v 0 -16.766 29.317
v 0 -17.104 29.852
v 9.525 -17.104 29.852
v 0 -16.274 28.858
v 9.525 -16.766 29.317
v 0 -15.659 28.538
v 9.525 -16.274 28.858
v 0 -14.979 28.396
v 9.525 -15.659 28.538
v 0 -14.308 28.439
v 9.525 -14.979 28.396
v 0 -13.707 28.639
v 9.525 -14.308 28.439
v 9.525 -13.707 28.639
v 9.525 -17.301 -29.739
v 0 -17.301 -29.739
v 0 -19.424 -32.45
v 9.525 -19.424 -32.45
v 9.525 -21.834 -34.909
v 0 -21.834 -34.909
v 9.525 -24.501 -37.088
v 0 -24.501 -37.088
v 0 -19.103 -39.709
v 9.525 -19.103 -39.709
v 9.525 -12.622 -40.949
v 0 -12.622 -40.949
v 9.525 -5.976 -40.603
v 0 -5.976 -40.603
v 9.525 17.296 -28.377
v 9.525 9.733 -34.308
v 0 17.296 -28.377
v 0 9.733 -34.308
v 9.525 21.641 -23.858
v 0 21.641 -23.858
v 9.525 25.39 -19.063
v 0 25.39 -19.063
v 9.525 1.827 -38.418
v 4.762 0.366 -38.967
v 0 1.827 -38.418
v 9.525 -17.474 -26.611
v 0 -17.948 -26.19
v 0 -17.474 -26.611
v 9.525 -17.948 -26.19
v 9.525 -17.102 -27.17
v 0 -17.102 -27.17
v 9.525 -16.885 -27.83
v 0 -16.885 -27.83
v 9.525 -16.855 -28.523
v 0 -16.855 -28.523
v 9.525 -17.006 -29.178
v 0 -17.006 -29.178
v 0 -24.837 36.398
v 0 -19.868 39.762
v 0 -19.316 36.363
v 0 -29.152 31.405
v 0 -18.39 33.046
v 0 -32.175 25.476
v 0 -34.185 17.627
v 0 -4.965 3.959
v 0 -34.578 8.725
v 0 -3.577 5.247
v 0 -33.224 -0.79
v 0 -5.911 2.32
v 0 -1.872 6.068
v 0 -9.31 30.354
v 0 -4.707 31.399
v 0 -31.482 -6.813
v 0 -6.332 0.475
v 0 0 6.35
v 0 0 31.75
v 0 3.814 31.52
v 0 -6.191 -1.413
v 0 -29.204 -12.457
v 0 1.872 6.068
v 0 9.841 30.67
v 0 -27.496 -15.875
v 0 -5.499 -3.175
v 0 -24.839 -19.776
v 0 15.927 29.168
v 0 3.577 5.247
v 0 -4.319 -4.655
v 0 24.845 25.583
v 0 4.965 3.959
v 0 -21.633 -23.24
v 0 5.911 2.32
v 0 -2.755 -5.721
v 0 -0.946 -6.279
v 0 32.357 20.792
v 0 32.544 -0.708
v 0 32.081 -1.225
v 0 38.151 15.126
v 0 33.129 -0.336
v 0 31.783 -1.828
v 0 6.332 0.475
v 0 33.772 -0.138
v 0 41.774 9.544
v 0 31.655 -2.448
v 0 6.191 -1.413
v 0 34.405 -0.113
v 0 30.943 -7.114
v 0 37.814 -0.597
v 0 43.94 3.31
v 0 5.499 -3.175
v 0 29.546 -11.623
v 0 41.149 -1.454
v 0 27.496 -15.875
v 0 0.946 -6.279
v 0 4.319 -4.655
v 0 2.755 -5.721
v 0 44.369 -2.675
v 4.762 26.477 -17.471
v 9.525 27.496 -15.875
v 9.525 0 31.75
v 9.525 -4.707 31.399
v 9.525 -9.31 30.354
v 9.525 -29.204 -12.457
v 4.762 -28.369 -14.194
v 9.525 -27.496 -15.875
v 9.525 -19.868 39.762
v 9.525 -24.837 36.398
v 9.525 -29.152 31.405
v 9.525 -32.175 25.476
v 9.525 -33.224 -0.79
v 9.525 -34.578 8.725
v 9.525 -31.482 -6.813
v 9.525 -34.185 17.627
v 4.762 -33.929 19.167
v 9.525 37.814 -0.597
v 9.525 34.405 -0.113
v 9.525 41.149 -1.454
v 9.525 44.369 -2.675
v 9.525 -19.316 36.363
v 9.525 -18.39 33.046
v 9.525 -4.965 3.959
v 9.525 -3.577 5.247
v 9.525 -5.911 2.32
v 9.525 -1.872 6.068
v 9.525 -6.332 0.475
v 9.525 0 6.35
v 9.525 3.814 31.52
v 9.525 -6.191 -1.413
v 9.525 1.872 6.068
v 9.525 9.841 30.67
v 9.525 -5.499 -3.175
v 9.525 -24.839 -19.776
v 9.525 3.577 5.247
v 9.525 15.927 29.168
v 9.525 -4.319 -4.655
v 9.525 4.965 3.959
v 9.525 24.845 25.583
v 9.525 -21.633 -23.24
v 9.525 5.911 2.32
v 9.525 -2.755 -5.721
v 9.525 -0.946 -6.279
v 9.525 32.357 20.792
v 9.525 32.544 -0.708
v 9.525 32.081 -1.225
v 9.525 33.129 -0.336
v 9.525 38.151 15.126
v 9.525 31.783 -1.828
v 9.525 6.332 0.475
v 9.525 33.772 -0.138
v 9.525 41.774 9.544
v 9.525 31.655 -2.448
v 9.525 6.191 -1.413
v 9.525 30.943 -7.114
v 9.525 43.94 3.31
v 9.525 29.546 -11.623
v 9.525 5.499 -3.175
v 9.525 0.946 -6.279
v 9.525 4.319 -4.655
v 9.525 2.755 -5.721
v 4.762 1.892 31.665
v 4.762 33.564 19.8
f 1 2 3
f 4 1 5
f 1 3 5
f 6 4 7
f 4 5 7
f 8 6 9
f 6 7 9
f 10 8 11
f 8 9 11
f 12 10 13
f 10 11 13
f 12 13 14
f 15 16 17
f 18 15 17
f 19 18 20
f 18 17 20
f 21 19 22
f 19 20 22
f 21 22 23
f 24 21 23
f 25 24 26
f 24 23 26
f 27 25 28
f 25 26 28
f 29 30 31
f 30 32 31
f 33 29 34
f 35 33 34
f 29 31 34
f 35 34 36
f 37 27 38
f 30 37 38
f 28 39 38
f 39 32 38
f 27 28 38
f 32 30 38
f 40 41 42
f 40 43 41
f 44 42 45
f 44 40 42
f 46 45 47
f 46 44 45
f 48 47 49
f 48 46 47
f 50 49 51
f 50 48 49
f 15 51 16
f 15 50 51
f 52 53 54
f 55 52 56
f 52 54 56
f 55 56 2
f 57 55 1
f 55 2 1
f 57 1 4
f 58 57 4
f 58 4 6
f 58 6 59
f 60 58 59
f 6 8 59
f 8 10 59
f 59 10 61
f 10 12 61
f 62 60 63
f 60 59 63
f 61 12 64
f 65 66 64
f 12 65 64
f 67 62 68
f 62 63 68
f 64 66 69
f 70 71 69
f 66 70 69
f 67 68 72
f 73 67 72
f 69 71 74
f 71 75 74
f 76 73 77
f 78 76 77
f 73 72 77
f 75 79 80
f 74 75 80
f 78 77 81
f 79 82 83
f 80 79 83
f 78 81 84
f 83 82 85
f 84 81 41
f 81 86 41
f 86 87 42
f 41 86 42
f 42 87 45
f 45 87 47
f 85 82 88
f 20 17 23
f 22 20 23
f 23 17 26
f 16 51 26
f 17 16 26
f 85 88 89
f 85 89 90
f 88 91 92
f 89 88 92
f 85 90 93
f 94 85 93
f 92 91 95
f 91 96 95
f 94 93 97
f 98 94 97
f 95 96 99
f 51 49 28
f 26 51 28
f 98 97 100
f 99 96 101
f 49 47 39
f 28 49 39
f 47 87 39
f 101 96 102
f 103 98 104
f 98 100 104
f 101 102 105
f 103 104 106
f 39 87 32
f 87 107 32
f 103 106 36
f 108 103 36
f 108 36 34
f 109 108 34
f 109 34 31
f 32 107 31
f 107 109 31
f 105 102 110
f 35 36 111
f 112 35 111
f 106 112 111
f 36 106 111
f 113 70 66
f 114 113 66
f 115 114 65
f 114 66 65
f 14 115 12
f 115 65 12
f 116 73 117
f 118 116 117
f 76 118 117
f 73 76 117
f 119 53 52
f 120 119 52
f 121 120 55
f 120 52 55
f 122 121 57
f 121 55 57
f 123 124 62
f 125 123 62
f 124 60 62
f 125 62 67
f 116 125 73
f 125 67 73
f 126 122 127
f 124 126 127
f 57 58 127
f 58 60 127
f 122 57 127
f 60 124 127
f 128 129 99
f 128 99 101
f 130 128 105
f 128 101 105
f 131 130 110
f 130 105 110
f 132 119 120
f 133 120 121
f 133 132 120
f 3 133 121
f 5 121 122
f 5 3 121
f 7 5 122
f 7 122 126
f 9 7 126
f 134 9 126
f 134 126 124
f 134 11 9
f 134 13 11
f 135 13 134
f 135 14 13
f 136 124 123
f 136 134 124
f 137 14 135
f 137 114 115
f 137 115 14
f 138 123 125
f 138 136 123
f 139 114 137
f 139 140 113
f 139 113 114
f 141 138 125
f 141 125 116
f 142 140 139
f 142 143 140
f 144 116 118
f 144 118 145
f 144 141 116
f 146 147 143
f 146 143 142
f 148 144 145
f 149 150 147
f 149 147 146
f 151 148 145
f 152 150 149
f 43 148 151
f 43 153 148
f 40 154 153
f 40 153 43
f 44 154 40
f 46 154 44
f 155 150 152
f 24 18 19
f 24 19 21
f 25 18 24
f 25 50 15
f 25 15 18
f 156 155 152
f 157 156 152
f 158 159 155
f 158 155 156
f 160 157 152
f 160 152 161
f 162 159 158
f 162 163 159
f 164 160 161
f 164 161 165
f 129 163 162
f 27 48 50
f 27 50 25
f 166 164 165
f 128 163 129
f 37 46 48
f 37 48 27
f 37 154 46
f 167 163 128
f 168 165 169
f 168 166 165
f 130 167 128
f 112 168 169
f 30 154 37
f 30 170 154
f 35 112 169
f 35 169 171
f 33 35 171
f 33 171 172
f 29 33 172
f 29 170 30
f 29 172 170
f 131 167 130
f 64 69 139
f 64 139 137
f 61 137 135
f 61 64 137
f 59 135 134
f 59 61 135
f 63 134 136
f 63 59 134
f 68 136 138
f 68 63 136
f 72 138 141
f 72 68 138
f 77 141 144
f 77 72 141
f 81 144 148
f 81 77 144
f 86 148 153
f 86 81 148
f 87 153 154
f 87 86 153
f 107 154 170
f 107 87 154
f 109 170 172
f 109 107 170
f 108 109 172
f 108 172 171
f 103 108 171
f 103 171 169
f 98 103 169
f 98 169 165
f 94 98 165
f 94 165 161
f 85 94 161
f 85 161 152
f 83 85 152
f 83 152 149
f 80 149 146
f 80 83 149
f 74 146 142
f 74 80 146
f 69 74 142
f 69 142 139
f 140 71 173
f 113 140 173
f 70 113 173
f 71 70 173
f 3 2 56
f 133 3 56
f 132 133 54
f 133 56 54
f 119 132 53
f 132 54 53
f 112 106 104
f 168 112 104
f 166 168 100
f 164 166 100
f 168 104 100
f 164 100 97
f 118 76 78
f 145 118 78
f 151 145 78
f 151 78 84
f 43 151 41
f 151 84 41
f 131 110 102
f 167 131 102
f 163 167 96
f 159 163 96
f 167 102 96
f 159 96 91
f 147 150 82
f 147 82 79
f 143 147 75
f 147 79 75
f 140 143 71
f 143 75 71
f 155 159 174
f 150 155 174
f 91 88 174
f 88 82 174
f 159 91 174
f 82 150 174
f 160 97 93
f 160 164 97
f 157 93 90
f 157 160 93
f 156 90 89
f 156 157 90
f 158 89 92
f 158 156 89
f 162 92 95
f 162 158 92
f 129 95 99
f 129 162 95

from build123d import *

# Parameters (mm, degrees)
SKETCH1_R           = 6.35
BOSS_EXTRUDE3_DEPTH = 9.525
FILLET3_R           = 2.54


with BuildPart() as part:
    # Sketch1 → Boss-Extrude3 (new body)
    # profile 1 of 4: a face of its own
    with BuildSketch(Plane(origin=(0, 0, 0), x_dir=(0, 0, -1), z_dir=(1, 0, 0))):
        with BuildLine():
            ThreePointArc((-31.520099492, 3.813899322), (-21.059097755, 23.760827043), (0, 31.75))
            ThreePointArc((0, 31.75), (0.675988504, 38.199887052), (2.67457554, 44.369461859))
            add(Edge.make_bspline(
                [(2.67457554, 44.369461859), (-27.656863026, 46.197830298), (-31.520099492, 3.813899322)],
                knots=[3.141592654, 3.141592654, 3.141592654, 4.660979846, 4.660979846, 4.660979846], degree=2, weights=[1, 0.709776495, 0.966045781]))
        make_face()
    # profile 2 of 4: a face of its own
    with BuildSketch(Plane(origin=(0, 0, 0), x_dir=(0, 0, -1), z_dir=(1, 0, 0))):
        with BuildLine():
            add(Edge.make_bspline(
                [(19.062983446, 25.390257228), (17.50131988, 26.492217898), (15.875, 27.49630657)],
                knots=[1.519387193, 1.519387193, 1.519387193, 1.613788447, 1.613788447, 1.613788447], degree=2, weights=[0.966045781, 0.981968084, 1]))
            ThreePointArc((15.875, 27.49630657), (8.217504682, 30.668144985), (0, 31.75))
            ThreePointArc((0, 31.75), (-21.059097755, 23.760827043), (-31.520099492, 3.813899322))
            add(Edge.make_bspline(
                [(-31.520099492, 3.813899322), (-31.693593642, 1.910478667), (-31.75, 0)],
                knots=[4.660979846, 4.660979846, 4.660979846, 4.7553811, 4.7553811, 4.7553811], degree=2, weights=[0.966045781, 0.981968084, 1]))
            ThreePointArc((-31.75, 0), (-30.668144985, -8.217504682), (-27.49630657, -15.875))
            ThreePointArc((-27.49630657, -15.875), (-10.047930956, -30.118127158), (12.457116045, -29.204156551))
            add(Edge.make_bspline(
                [(12.457116045, -29.204156551), (14.192273762, -28.402696564), (15.875, -27.49630657)],
                knots=[1.519387193, 1.519387193, 1.519387193, 1.613788447, 1.613788447, 1.613788447], degree=2, weights=[0.966045781, 0.981968084, 1]))
            ThreePointArc((15.875, -27.49630657), (22.450640303, -22.450640303), (27.49630657, -15.875))
            ThreePointArc((27.49630657, -15.875), (30.668144985, -8.217504682), (31.75, 0))
            ThreePointArc((31.75, 0), (28.401692066, 14.191771834), (19.062983446, 25.390257228))
        make_face()
        with Locations(Location((0, 0, 0), (0, 0, 180))):
            Circle(SKETCH1_R, mode=Mode.SUBTRACT)
    # profile 3 of 4: a face of its own
    with BuildSketch(Plane(origin=(0, 0, 0), x_dir=(0, 0, -1), z_dir=(1, 0, 0))):
        with BuildLine():
            add(Edge.make_bspline(
                [(37.087793352, -24.500981292), (53.836926151, 0.852630821), (19.062983446, 25.390257228)],
                knots=[0, 0, 0, 1.519387193, 1.519387193, 1.519387193], degree=2, weights=[1, 0.709776495, 0.966045781]))
            ThreePointArc((19.062983446, 25.390257228), (28.401692066, 14.191771834), (31.75, 0))
            ThreePointArc((31.75, 0), (30.668144985, -8.217504682), (27.49630657, -15.875))
            ThreePointArc((27.49630657, -15.875), (32.744078357, -19.685366743), (37.087793352, -24.500981292))
        make_face()
    # profile 4 of 4: a face of its own
    with BuildSketch(Plane(origin=(0, 0, 0), x_dir=(0, 0, -1), z_dir=(1, 0, 0))):
        with BuildLine():
            ThreePointArc((-27.49630657, -15.875), (-33.420066861, -18.514520309), (-39.762368892, -19.868480568))
            add(Edge.make_bspline(
                [(-39.762368892, -19.868480568), (-26.180063124, -47.050461119), (12.457116045, -29.204156551)],
                knots=[0, 0, 0, 1.519387193, 1.519387193, 1.519387193], degree=2, weights=[1, 0.709776495, 0.966045781]))
            ThreePointArc((12.457116045, -29.204156551), (-10.047930956, -30.118127158), (-27.49630657, -15.875))
        make_face()
    extrude(amount=BOSS_EXTRUDE3_DEPTH)

    # Fillet3
    fillet3_edges = [part.edges().sort_by_distance(p)[0] for p in [
        (4.7625, 31.75, 0),
        (4.7625, -15.875, -27.49630657),
        (4.7625, -15.875, 27.49630657),
    ]]
    fillet(fillet3_edges, radius=FILLET3_R)


solid = part.part
